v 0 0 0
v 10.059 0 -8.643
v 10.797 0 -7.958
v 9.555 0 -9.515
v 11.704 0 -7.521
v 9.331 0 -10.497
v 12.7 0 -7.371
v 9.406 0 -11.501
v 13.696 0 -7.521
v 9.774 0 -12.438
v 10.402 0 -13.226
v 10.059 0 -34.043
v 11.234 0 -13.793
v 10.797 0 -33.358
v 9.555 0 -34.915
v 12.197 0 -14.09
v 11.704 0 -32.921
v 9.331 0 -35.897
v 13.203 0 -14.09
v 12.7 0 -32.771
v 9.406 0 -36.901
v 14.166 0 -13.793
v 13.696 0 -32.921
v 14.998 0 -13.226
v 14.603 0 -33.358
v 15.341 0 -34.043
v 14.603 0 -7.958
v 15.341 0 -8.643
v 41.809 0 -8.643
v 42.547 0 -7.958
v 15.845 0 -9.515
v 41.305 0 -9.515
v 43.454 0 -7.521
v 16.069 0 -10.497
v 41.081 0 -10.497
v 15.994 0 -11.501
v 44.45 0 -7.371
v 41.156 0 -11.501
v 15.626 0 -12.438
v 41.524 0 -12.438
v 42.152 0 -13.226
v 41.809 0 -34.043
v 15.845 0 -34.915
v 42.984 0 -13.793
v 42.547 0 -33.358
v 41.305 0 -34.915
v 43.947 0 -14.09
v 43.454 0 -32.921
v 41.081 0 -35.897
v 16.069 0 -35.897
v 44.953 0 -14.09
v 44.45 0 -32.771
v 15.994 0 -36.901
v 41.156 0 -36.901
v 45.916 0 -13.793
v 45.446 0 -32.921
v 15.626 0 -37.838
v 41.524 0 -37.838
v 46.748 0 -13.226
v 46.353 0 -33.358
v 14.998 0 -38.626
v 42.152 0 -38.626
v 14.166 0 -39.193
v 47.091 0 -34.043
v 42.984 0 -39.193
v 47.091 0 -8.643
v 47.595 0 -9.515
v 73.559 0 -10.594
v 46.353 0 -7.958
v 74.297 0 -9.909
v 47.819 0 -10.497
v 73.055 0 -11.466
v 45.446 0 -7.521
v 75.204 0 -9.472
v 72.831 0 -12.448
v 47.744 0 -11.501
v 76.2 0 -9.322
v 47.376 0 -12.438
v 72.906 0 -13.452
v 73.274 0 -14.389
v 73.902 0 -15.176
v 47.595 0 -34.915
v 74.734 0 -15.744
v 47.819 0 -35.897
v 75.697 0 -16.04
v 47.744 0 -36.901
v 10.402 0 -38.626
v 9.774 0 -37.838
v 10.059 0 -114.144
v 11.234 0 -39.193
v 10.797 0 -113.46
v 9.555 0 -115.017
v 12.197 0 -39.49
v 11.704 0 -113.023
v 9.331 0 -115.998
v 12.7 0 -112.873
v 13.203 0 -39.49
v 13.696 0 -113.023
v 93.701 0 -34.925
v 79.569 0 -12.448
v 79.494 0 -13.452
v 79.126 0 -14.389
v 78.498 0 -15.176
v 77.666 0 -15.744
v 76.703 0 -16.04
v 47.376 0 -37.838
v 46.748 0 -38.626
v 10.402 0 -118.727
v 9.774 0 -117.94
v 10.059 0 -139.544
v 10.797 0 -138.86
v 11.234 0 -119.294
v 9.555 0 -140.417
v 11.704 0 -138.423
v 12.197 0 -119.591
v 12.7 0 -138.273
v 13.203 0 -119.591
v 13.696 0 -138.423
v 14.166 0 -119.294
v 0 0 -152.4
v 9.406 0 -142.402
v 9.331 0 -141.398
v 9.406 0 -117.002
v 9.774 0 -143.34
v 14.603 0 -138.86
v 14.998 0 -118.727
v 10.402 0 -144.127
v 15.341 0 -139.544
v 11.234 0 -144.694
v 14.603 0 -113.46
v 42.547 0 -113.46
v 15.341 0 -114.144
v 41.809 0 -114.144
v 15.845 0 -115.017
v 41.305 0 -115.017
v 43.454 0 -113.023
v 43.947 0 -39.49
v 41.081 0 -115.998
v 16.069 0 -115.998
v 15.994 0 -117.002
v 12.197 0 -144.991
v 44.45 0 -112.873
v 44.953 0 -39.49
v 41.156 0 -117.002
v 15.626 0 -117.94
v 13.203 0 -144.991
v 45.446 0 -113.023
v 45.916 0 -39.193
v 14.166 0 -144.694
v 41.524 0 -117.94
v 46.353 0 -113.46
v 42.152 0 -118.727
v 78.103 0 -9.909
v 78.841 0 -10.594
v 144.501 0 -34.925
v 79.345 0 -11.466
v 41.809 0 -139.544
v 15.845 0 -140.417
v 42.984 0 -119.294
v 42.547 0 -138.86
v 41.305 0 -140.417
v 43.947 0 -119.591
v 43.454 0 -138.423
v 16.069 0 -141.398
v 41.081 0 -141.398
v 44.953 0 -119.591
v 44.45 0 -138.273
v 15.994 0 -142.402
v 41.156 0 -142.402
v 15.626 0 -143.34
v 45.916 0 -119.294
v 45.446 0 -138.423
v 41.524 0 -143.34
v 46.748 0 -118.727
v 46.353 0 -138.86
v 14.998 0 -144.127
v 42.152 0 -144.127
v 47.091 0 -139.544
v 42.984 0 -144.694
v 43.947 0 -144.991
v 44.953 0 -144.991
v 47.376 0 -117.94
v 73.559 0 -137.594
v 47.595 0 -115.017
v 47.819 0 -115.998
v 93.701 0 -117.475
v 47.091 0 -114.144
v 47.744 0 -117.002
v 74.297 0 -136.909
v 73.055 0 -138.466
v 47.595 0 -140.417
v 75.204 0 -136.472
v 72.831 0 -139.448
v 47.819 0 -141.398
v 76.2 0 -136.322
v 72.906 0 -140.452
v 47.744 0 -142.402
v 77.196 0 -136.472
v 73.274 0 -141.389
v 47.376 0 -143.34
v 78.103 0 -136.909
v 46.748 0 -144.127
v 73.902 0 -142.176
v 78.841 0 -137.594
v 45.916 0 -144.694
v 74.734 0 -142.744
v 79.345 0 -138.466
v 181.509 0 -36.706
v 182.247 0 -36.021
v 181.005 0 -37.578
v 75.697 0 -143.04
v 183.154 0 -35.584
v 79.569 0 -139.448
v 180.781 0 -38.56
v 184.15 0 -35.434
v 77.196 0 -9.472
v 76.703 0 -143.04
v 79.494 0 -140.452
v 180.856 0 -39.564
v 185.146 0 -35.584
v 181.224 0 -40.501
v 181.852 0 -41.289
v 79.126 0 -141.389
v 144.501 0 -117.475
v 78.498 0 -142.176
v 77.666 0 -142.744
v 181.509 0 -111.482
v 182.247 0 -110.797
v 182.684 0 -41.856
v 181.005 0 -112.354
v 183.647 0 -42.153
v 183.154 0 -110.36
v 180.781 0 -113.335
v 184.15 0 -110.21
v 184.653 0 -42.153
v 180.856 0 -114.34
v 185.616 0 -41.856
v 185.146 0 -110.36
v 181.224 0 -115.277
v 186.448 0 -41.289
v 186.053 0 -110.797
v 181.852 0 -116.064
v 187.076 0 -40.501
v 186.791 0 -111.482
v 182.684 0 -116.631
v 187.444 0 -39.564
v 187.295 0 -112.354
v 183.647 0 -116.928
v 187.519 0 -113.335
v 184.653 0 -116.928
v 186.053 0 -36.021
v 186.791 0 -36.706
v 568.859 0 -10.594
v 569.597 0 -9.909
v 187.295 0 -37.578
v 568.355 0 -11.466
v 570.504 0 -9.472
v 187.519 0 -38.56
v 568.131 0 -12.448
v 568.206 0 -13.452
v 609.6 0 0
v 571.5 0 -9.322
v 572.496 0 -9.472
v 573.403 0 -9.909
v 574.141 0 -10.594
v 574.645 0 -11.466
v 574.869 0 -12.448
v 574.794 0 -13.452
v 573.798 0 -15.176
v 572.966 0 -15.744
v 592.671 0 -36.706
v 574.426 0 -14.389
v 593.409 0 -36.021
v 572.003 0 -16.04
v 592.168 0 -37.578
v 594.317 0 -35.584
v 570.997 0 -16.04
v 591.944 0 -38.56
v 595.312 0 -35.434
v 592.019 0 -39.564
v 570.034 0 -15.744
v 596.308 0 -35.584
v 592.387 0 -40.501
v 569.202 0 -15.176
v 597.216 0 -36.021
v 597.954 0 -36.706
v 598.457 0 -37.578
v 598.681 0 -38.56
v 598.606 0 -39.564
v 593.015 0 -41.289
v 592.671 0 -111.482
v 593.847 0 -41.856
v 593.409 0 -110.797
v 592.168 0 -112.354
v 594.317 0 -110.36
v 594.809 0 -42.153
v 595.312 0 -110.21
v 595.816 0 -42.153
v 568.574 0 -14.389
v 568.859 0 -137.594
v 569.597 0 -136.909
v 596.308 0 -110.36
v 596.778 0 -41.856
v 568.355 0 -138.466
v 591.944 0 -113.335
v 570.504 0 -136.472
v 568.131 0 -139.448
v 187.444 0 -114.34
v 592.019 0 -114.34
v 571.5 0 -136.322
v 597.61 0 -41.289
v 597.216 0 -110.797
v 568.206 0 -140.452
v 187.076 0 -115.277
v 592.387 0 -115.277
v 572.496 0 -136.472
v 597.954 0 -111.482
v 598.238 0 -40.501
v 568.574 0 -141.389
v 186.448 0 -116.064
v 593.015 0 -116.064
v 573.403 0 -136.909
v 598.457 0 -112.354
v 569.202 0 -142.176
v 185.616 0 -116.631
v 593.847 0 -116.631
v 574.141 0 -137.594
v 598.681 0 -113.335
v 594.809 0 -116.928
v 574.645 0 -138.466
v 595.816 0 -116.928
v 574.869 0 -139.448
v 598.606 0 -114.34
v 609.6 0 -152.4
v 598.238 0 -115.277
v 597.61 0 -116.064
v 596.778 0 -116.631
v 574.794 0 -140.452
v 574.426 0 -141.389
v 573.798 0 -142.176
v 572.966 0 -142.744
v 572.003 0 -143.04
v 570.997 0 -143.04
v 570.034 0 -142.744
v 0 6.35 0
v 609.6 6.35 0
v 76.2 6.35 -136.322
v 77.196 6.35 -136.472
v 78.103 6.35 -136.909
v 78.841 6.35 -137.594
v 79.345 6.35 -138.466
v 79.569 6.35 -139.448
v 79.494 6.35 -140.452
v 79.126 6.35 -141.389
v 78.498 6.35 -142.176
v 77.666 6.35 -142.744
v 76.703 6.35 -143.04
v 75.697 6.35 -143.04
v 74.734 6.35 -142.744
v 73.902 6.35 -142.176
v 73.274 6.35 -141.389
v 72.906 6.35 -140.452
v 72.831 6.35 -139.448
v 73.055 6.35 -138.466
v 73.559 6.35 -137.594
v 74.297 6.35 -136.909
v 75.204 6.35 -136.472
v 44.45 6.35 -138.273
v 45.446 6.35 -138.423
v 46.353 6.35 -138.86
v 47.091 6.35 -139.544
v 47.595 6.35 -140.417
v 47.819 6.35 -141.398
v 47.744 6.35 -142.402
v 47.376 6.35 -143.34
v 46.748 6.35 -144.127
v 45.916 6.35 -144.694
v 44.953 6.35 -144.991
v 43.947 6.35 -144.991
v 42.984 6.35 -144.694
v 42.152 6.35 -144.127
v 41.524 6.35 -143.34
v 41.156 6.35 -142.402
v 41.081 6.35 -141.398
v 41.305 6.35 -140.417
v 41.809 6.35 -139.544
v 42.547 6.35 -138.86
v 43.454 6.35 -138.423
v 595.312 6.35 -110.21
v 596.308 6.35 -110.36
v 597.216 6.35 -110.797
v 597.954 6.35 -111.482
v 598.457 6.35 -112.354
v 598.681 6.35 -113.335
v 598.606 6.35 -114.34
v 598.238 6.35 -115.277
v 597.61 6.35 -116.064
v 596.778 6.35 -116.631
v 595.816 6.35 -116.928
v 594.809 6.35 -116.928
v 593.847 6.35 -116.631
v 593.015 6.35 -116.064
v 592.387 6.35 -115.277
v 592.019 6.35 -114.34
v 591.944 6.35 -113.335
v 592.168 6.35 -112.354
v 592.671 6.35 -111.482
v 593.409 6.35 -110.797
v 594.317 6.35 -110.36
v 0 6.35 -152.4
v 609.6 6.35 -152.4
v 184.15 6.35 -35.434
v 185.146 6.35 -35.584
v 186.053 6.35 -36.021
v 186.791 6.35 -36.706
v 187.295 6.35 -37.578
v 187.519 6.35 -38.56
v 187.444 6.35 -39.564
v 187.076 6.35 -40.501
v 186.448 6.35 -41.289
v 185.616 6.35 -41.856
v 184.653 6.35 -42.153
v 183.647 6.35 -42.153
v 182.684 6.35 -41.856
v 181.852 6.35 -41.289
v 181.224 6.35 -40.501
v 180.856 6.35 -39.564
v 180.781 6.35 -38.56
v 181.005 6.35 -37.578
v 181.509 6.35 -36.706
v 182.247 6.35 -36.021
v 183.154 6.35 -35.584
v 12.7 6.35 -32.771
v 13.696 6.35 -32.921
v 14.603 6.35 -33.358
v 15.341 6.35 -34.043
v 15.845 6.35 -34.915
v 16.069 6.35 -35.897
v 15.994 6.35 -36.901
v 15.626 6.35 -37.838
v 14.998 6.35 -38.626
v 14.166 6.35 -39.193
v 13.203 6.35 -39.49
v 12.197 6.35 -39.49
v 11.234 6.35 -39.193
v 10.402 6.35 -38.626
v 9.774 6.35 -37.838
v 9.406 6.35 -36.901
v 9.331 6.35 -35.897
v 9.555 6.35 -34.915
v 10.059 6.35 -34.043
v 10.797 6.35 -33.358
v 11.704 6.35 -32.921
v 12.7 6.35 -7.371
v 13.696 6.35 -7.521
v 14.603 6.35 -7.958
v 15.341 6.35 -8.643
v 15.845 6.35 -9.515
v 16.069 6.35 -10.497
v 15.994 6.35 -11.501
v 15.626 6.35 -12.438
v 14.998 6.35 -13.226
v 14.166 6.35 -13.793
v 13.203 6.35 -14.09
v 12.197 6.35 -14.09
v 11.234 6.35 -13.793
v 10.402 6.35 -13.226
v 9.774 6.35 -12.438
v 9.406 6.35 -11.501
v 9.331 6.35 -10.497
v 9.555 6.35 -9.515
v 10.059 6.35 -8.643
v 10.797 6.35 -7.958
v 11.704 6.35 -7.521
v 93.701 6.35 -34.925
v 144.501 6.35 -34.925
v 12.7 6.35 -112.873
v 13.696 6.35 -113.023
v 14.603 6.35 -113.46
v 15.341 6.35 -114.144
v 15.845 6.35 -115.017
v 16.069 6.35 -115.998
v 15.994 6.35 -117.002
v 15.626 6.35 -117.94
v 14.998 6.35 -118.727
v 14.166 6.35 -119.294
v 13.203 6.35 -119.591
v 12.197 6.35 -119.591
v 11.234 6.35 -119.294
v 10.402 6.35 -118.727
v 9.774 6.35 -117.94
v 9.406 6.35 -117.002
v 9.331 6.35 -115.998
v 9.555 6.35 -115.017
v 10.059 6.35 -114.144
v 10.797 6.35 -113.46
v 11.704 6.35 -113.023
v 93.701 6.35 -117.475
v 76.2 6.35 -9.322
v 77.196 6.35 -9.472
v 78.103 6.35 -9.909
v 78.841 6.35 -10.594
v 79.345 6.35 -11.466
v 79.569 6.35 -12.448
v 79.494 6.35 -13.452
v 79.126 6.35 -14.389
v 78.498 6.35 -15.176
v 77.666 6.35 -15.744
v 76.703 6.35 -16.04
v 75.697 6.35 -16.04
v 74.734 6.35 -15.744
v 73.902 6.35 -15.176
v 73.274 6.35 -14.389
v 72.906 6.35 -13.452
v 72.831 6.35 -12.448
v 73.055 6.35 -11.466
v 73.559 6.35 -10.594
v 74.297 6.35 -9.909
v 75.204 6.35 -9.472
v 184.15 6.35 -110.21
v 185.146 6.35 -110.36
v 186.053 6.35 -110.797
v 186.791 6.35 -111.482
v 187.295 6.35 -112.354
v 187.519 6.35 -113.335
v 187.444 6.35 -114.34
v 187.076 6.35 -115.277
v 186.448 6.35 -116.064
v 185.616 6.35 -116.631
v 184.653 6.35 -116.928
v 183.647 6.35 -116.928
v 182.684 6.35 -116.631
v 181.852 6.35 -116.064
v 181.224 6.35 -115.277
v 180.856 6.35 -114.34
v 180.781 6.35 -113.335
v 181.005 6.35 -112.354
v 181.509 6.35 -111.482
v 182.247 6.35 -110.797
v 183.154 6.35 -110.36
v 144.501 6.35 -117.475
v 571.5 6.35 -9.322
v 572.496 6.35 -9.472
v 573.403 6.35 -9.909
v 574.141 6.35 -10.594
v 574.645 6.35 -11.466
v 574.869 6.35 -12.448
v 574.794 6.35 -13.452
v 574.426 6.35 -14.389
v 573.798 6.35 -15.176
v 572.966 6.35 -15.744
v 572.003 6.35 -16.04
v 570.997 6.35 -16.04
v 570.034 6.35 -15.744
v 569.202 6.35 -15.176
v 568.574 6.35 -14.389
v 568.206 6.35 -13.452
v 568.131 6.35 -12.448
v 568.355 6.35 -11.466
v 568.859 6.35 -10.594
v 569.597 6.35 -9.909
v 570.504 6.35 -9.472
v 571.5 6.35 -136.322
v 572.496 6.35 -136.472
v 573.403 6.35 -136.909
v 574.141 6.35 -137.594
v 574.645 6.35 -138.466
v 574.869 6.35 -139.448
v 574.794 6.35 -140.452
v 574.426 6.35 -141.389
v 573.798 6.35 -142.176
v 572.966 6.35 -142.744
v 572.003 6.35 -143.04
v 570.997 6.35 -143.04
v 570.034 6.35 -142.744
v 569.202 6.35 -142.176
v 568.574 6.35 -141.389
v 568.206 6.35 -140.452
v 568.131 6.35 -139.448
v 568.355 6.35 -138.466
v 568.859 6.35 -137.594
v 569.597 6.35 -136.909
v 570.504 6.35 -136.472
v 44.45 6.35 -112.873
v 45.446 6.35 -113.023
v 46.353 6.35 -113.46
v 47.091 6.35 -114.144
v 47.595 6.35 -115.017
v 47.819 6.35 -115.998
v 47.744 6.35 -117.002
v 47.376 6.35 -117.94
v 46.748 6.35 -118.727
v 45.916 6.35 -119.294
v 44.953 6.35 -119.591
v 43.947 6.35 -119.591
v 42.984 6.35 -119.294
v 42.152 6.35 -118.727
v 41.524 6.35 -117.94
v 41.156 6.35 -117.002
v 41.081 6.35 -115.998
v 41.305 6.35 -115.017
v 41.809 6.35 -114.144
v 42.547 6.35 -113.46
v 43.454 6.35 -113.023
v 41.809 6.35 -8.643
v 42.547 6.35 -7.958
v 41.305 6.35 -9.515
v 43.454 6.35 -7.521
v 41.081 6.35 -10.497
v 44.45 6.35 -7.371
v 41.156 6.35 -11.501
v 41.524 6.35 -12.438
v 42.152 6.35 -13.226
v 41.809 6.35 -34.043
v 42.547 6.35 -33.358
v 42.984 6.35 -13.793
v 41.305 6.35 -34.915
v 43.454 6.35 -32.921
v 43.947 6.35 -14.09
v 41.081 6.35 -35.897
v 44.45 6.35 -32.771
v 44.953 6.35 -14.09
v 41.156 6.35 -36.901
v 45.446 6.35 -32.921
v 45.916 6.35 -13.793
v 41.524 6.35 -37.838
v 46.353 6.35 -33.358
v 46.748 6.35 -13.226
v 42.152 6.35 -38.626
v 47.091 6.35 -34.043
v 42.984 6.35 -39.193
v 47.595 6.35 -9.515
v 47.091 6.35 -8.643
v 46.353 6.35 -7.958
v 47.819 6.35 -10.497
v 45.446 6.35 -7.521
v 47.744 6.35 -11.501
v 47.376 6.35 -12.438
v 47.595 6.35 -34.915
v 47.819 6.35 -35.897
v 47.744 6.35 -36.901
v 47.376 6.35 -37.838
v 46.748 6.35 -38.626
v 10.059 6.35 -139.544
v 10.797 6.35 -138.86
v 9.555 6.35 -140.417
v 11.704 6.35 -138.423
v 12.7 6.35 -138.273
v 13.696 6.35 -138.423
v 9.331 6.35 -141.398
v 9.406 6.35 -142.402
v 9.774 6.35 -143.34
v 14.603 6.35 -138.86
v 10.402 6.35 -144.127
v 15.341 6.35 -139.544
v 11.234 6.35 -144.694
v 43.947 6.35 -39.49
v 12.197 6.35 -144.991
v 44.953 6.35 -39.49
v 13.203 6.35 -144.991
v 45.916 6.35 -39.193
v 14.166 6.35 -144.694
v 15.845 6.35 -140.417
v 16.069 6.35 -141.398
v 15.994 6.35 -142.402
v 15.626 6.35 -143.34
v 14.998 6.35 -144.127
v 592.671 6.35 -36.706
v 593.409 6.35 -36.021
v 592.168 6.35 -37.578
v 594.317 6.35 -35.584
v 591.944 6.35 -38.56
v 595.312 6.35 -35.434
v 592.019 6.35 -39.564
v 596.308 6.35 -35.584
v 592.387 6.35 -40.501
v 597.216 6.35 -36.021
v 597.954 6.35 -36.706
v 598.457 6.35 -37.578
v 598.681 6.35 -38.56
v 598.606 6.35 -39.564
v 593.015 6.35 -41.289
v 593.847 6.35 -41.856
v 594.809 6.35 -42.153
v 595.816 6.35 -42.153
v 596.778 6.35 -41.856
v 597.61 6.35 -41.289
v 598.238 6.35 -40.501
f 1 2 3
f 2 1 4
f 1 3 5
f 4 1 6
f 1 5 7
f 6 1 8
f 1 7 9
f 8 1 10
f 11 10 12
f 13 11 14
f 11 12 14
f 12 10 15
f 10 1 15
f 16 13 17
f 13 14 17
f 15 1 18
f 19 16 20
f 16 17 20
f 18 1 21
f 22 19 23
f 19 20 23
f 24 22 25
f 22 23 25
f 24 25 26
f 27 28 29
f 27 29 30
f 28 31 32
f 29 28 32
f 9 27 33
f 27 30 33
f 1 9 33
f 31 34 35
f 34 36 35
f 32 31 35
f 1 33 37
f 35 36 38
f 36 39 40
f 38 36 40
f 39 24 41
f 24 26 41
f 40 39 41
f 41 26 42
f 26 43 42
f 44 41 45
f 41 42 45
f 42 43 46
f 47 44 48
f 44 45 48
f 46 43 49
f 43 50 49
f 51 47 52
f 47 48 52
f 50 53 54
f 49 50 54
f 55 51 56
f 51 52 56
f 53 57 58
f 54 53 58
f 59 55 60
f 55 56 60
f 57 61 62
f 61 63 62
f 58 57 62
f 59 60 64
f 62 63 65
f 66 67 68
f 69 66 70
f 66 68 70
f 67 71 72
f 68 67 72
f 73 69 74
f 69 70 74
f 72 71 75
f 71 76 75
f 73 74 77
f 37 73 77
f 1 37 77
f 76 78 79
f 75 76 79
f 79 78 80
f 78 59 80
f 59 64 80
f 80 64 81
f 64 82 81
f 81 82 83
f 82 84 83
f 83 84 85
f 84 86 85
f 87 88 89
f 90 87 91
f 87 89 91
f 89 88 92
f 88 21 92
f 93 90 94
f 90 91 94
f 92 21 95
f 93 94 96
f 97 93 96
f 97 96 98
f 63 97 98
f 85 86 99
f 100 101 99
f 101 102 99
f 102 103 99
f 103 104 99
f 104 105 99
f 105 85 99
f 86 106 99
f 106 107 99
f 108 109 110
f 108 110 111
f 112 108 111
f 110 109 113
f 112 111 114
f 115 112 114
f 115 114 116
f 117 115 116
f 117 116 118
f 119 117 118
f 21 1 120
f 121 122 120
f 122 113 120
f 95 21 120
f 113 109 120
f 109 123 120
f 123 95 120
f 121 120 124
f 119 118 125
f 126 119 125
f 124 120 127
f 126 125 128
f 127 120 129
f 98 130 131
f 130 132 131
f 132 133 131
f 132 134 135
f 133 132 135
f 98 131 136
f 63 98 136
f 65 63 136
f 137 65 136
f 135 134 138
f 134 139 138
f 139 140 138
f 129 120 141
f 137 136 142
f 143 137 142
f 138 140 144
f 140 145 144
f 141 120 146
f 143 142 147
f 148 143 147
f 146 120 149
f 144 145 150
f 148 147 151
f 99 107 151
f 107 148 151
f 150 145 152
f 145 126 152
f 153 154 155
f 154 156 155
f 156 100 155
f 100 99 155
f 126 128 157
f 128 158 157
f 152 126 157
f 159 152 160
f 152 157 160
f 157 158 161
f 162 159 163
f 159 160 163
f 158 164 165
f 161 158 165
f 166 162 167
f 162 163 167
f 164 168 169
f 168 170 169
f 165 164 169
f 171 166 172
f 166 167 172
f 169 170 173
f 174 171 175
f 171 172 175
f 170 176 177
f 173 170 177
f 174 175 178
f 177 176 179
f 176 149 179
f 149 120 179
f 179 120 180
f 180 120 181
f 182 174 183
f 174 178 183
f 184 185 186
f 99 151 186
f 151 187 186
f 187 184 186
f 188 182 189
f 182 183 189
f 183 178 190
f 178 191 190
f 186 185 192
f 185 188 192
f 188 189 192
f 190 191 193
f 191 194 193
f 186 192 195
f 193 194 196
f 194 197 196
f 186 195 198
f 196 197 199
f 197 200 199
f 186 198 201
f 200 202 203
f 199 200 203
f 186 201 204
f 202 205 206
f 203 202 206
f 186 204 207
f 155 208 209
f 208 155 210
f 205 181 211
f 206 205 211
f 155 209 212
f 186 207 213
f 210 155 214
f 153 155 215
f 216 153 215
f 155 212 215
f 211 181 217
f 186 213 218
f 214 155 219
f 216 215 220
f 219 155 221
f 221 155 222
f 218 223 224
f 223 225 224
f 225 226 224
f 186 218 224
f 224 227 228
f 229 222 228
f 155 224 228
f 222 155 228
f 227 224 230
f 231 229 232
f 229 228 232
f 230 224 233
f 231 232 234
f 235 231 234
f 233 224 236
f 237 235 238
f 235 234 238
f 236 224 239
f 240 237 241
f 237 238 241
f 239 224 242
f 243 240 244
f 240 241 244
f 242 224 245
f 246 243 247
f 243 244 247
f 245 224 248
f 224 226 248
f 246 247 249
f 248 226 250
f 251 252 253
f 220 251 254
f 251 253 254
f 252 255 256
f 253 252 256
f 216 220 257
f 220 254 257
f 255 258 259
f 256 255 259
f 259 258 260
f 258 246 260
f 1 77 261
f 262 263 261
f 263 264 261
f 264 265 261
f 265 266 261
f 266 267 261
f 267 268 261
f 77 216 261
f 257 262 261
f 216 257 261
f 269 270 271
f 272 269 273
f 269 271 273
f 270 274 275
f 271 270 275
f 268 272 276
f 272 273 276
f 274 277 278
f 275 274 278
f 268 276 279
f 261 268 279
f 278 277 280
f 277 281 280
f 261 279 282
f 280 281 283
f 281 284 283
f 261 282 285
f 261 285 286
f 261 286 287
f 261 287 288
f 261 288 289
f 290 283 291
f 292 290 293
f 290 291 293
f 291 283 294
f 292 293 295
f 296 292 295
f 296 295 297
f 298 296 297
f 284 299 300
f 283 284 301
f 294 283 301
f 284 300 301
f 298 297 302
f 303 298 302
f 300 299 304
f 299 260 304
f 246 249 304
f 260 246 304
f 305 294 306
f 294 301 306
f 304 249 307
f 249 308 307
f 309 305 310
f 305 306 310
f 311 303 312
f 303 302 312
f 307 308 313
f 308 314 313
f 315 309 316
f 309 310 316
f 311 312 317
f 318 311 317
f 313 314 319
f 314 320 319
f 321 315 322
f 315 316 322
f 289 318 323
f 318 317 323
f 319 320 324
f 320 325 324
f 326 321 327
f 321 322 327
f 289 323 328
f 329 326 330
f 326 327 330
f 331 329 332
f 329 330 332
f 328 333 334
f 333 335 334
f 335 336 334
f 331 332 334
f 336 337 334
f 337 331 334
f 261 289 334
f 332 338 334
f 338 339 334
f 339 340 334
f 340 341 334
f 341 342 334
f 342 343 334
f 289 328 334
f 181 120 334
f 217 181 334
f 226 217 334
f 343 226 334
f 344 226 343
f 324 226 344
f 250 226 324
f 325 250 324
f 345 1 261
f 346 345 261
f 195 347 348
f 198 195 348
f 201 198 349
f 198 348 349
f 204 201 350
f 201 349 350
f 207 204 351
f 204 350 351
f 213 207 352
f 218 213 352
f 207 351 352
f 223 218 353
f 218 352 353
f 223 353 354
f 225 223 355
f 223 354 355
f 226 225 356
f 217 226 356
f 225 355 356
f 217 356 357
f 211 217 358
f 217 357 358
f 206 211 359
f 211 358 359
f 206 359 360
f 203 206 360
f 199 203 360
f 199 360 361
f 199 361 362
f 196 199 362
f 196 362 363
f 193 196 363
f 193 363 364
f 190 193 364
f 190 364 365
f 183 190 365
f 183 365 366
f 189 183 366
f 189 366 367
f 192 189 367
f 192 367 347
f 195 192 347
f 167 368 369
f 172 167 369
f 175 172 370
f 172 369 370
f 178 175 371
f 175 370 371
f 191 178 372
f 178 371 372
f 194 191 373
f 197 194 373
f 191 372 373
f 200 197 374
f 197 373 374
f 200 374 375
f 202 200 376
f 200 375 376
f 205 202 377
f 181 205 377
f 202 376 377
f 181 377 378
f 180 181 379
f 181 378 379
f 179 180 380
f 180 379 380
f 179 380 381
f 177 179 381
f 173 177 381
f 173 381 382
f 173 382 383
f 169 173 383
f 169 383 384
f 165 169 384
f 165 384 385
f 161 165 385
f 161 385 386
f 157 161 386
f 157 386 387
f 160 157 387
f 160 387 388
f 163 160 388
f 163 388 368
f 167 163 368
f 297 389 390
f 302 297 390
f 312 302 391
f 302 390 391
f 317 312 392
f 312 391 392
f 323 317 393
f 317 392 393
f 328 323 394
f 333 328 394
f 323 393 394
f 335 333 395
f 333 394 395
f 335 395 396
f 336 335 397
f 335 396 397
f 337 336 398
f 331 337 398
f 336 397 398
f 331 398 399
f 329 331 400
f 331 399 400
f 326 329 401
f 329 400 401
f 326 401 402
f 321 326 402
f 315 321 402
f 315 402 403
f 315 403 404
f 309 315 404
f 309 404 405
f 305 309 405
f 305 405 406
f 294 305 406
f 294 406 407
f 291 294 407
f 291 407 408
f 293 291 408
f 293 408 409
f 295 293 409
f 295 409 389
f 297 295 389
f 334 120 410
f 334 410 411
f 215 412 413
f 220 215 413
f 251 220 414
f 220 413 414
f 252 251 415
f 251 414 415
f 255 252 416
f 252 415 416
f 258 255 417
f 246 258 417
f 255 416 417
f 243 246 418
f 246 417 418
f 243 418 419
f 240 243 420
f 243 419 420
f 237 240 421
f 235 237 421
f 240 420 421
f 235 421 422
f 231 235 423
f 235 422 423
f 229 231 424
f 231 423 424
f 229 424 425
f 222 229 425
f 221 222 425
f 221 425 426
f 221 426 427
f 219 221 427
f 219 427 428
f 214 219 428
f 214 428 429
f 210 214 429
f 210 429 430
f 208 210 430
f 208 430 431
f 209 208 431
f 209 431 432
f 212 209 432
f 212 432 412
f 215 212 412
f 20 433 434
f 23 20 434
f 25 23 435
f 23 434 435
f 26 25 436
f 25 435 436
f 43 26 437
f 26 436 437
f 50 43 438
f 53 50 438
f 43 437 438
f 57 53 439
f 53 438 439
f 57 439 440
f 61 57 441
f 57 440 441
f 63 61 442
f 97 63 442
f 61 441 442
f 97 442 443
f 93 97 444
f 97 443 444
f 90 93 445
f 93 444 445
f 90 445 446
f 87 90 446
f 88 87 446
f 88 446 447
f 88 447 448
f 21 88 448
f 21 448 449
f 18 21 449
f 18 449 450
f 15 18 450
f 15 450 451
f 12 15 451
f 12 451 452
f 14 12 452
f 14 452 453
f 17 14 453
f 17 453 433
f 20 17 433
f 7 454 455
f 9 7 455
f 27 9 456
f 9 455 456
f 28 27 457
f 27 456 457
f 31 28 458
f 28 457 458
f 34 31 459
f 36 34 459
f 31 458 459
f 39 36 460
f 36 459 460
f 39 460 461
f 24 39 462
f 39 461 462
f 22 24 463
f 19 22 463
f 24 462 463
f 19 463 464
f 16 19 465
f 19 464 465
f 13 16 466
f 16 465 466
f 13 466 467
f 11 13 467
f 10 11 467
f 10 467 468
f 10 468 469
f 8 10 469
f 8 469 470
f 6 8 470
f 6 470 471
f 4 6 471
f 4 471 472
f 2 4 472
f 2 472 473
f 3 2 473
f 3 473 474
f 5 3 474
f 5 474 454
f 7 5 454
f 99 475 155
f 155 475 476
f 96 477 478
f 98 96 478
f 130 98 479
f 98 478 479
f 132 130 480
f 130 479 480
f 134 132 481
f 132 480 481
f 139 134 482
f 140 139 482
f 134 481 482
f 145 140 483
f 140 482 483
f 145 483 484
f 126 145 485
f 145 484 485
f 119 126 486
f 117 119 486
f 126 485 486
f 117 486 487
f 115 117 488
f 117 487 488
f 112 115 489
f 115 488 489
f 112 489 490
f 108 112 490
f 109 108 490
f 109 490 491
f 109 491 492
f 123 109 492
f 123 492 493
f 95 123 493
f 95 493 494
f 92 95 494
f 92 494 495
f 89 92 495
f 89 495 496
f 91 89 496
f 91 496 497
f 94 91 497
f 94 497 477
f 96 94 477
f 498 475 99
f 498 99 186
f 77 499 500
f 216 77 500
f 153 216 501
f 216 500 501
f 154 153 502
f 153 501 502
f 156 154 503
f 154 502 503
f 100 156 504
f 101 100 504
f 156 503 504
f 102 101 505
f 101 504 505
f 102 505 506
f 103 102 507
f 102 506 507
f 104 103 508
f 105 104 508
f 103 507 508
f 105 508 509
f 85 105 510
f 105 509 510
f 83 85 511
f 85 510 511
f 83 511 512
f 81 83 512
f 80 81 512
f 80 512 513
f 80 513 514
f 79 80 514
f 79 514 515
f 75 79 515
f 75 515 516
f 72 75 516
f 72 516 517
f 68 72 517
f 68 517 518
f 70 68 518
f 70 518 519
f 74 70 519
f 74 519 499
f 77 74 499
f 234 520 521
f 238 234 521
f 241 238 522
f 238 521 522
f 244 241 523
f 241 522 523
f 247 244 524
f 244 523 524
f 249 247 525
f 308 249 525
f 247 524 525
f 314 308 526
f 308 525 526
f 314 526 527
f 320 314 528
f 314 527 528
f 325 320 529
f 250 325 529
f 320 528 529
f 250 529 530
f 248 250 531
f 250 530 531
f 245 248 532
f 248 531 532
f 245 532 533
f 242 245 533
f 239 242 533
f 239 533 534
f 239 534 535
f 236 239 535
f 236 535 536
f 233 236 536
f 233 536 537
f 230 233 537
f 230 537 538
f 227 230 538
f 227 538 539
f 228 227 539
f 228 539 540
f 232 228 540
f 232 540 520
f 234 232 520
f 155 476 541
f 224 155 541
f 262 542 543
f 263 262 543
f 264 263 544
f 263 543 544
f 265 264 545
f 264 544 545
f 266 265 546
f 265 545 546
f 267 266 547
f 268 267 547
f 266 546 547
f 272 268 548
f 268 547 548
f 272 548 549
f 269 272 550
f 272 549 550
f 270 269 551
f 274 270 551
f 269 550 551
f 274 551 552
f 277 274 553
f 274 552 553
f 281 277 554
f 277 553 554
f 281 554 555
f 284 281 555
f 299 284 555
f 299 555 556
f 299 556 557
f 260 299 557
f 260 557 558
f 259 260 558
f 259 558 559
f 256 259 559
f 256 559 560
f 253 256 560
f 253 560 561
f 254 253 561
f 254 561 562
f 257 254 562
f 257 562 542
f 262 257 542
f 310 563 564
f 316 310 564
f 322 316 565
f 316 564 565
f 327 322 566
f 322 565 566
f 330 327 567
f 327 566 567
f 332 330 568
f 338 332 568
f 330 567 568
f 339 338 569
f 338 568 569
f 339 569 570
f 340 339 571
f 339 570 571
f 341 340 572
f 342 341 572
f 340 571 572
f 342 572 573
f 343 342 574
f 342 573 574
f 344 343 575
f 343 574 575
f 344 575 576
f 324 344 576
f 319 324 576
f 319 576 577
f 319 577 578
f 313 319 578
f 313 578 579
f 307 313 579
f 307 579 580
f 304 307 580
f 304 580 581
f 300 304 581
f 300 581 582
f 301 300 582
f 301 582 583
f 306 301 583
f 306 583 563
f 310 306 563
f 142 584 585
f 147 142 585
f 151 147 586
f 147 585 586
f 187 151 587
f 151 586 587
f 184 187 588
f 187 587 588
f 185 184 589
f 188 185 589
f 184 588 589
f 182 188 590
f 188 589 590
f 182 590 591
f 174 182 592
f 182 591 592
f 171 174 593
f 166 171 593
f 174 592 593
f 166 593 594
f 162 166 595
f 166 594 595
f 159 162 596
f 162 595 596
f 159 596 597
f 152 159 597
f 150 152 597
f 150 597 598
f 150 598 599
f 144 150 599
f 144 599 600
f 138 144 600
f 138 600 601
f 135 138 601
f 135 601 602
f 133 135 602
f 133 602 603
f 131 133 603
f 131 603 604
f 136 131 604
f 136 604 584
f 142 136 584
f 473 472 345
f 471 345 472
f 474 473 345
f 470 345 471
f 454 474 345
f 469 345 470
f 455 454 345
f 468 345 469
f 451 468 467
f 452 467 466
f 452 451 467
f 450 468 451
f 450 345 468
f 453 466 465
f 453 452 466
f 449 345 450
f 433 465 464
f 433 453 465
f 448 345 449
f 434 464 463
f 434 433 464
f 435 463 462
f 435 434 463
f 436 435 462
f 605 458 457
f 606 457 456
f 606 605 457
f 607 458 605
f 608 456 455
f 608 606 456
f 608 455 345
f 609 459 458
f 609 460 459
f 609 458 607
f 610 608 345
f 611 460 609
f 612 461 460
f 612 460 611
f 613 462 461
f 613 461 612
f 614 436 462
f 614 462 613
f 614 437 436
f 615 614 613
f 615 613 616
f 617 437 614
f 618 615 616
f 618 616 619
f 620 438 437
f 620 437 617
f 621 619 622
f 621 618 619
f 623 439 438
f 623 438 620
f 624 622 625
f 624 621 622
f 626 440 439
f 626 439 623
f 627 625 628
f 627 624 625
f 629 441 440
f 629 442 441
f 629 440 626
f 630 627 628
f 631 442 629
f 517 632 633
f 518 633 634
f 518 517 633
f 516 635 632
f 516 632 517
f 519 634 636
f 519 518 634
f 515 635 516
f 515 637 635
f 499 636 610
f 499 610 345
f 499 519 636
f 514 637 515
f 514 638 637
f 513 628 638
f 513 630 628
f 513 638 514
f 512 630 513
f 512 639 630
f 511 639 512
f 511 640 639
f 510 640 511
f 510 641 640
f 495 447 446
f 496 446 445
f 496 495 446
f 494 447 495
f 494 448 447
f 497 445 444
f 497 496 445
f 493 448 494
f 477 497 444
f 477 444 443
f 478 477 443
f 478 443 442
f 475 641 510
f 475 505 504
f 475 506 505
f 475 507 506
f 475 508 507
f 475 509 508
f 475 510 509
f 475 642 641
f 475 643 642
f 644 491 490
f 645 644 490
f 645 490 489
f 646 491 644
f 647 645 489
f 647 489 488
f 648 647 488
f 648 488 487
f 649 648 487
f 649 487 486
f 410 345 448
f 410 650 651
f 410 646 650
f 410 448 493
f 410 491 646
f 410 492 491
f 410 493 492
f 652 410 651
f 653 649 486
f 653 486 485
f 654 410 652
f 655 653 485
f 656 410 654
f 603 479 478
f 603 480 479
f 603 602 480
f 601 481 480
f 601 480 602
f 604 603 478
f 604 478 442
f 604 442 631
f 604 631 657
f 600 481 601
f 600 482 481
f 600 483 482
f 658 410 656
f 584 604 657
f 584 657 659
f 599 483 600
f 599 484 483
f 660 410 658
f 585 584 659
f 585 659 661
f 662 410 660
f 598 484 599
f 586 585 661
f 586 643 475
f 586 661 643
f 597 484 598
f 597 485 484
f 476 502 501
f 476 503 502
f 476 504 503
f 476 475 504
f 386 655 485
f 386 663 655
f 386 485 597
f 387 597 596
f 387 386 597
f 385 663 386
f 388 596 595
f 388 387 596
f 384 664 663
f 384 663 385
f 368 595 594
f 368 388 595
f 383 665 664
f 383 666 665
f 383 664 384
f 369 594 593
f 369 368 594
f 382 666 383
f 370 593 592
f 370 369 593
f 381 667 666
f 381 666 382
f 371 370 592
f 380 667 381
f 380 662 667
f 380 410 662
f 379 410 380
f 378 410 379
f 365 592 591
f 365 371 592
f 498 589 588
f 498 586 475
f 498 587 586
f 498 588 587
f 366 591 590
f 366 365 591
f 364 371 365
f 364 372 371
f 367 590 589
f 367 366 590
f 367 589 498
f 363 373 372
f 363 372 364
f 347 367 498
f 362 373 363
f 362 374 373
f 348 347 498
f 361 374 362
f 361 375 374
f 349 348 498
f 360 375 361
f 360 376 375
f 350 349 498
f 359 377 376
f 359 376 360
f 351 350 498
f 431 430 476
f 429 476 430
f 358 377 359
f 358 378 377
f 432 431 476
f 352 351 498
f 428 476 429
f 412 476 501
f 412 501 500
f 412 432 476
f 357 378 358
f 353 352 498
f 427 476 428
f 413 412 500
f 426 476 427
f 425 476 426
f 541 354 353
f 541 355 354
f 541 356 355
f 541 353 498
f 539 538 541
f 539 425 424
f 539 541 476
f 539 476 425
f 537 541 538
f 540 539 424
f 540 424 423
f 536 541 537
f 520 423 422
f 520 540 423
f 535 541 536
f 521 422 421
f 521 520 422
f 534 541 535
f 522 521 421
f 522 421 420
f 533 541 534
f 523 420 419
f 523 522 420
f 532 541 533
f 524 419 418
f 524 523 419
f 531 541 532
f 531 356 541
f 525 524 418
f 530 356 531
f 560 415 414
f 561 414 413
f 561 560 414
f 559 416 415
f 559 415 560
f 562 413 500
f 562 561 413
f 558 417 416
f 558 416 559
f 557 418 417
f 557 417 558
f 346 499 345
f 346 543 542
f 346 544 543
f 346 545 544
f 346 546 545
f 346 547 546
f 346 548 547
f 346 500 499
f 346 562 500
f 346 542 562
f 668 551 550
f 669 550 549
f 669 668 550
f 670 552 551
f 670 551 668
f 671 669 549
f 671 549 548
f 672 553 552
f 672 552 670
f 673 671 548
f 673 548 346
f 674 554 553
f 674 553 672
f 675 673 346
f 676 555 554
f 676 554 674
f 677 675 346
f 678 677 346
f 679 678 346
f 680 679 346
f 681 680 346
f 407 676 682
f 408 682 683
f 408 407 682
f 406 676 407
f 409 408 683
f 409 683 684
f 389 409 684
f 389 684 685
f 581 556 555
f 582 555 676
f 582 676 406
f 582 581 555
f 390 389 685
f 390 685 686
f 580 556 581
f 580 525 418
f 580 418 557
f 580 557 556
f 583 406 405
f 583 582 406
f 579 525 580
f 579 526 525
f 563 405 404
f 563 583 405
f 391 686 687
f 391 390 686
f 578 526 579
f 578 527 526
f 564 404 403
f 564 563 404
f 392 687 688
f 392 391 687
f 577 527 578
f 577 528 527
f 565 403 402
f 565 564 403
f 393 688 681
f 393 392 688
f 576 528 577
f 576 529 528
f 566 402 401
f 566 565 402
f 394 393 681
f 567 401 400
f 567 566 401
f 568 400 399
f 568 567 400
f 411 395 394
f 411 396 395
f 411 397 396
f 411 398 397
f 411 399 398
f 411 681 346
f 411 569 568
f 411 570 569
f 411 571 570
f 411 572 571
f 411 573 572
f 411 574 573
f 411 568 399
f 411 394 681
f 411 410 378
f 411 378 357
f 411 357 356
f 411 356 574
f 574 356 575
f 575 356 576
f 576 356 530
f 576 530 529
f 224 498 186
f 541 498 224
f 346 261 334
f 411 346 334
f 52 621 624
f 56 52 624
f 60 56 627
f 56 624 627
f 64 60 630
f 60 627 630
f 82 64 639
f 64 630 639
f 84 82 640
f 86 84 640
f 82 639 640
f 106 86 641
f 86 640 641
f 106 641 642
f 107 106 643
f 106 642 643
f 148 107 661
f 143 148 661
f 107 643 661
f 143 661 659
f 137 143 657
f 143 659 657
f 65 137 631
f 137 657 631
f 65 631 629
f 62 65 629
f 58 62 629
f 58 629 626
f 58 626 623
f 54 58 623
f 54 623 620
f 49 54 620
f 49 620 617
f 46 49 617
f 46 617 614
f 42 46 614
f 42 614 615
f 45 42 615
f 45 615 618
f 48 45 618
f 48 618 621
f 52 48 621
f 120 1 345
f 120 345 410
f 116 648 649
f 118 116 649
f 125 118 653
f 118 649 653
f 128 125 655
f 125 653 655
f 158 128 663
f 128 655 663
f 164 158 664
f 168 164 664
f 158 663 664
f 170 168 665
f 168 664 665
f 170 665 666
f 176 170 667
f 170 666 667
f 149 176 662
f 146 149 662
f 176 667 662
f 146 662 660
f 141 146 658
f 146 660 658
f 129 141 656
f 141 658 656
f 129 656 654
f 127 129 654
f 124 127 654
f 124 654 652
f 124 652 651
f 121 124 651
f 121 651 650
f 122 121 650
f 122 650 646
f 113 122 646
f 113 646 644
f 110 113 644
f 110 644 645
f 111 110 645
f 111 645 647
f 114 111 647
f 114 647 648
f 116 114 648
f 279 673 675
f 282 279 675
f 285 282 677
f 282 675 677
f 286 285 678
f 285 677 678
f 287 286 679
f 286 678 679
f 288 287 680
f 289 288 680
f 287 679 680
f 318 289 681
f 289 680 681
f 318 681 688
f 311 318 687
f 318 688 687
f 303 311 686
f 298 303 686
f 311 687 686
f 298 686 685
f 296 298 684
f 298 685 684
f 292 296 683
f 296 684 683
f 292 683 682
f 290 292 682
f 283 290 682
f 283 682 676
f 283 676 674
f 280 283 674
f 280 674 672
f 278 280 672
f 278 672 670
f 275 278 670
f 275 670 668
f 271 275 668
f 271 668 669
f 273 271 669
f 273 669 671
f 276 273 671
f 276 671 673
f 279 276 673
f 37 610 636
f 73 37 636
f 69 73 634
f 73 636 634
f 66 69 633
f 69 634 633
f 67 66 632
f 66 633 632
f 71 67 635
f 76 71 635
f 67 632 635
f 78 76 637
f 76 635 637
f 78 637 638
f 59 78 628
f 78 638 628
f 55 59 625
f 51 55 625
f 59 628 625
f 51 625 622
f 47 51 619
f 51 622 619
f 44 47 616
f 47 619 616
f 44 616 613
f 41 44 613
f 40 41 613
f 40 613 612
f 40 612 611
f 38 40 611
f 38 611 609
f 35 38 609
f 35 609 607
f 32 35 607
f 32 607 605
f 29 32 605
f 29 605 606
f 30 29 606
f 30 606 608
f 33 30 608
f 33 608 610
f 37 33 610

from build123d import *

# Parameters (mm, degrees)
SKETCH2_W           = 609.6
SKETCH2_H           = 152.4
BOSS_EXTRUDE1_DEPTH = 6.35
CUT_EXTRUDE1_REACH  = 630.393
SKETCH3_W           = 50.8
SKETCH3_H           = 82.55
SKETCH4_R           = 3.3782
CUT_EXTRUDE2_DEPTH  = 629.393381967
SKETCH5_R           = 3.3782
CUT_EXTRUDE3_DEPTH  = 629.393381967
SKETCH6_R           = 3.3782
CUT_EXTRUDE4_DEPTH  = 629.393381967


with BuildPart() as part:
    # Sketch2 → Boss-Extrude1 (new body)
    with BuildSketch(Plane(origin=(0, 0, 0), x_dir=(1, 0, 0), z_dir=(0, 1, 0))):
        with Locations((304.8, 76.2)):
            Rectangle(SKETCH2_W, SKETCH2_H)
    extrude(amount=BOSS_EXTRUDE1_DEPTH)

    # Sketch3 → Cut-Extrude1 (cut, up to next)
    with BuildSketch(Plane(origin=(0, 6.35, 0), x_dir=(1, 0, 0), z_dir=(0, 1, 0)), mode=Mode.PRIVATE) as cut_extrude1_sk1:
        with Locations((119.1006, 76.2)):
            Rectangle(SKETCH3_W, SKETCH3_H)
    cut_extrude1_tool1 = extrude(cut_extrude1_sk1.sketch, amount=-CUT_EXTRUDE1_REACH, mode=Mode.PRIVATE) & part.part
    add(cut_extrude1_tool1.solids().sort_by_distance((119.1006, 6.35, -76.2))[0], mode=Mode.SUBTRACT)

    # Sketch4 → Cut-Extrude2 (cut, through all)
    with BuildSketch(Plane(origin=(0, 6.35, 0), x_dir=(1, 0, 0), z_dir=(0, 1, 0))):
        with Locations(Location((571.5, 12.7, 0), (0, 0, 270))):
            Circle(SKETCH4_R)
        with Locations(Location((571.5, 139.7, 0), (0, 0, 270))):
            Circle(SKETCH4_R)
        with Locations(Location((76.2, 12.7, 0), (0, 0, 270))):
            Circle(SKETCH4_R)
        with Locations(Location((76.2, 139.7, 0), (0, 0, 270))):
            Circle(SKETCH4_R)
    extrude(amount=-CUT_EXTRUDE2_DEPTH, mode=Mode.SUBTRACT)

    # Sketch5 → Cut-Extrude3 (cut, through all)
    with BuildSketch(Plane(origin=(0, 6.35, 0), x_dir=(1, 0, 0), z_dir=(0, 1, 0))):
        with Locations(Location((595.3125, 113.587796728, 0), (0, 0, 270))):
            Circle(SKETCH5_R)
        with Locations(Location((595.3125, 38.812203272, 0), (0, 0, 270))):
            Circle(SKETCH5_R)
        with Locations(Location((184.15, 38.812203272, 0), (0, 0, 270))):
            Circle(SKETCH5_R)
        with Locations(Location((184.15, 113.587796728, 0), (0, 0, 270))):
            Circle(SKETCH5_R)
    extrude(amount=-CUT_EXTRUDE3_DEPTH, mode=Mode.SUBTRACT)

    # Sketch6 → Cut-Extrude4 (cut, through all)
    with BuildSketch(Plane(origin=(0, 6.35, 0), x_dir=(1, 0, 0), z_dir=(0, 1, 0))):
        with Locations(Location((12.7, 36.14928, 0), (0, 0, 270))):
            Circle(SKETCH6_R)
        with Locations(Location((12.7, 10.74928, 0), (0, 0, 270))):
            Circle(SKETCH6_R)
        with Locations(Location((44.45, 10.74928, 0), (0, 0, 270))):
            Circle(SKETCH6_R)
        with Locations(Location((44.45, 36.14928, 0), (0, 0, 270))):
            Circle(SKETCH6_R)
        with Locations(Location((12.7, 141.65072, 0), (0, 0, 270))):
            Circle(SKETCH6_R)
        with Locations(Location((12.7, 116.25072, 0), (0, 0, 270))):
            Circle(SKETCH6_R)
        with Locations(Location((44.45, 116.25072, 0), (0, 0, 270))):
            Circle(SKETCH6_R)
        with Locations(Location((44.45, 141.65072, 0), (0, 0, 270))):
            Circle(SKETCH6_R)
    extrude(amount=-CUT_EXTRUDE4_DEPTH, mode=Mode.SUBTRACT)


solid = part.part
